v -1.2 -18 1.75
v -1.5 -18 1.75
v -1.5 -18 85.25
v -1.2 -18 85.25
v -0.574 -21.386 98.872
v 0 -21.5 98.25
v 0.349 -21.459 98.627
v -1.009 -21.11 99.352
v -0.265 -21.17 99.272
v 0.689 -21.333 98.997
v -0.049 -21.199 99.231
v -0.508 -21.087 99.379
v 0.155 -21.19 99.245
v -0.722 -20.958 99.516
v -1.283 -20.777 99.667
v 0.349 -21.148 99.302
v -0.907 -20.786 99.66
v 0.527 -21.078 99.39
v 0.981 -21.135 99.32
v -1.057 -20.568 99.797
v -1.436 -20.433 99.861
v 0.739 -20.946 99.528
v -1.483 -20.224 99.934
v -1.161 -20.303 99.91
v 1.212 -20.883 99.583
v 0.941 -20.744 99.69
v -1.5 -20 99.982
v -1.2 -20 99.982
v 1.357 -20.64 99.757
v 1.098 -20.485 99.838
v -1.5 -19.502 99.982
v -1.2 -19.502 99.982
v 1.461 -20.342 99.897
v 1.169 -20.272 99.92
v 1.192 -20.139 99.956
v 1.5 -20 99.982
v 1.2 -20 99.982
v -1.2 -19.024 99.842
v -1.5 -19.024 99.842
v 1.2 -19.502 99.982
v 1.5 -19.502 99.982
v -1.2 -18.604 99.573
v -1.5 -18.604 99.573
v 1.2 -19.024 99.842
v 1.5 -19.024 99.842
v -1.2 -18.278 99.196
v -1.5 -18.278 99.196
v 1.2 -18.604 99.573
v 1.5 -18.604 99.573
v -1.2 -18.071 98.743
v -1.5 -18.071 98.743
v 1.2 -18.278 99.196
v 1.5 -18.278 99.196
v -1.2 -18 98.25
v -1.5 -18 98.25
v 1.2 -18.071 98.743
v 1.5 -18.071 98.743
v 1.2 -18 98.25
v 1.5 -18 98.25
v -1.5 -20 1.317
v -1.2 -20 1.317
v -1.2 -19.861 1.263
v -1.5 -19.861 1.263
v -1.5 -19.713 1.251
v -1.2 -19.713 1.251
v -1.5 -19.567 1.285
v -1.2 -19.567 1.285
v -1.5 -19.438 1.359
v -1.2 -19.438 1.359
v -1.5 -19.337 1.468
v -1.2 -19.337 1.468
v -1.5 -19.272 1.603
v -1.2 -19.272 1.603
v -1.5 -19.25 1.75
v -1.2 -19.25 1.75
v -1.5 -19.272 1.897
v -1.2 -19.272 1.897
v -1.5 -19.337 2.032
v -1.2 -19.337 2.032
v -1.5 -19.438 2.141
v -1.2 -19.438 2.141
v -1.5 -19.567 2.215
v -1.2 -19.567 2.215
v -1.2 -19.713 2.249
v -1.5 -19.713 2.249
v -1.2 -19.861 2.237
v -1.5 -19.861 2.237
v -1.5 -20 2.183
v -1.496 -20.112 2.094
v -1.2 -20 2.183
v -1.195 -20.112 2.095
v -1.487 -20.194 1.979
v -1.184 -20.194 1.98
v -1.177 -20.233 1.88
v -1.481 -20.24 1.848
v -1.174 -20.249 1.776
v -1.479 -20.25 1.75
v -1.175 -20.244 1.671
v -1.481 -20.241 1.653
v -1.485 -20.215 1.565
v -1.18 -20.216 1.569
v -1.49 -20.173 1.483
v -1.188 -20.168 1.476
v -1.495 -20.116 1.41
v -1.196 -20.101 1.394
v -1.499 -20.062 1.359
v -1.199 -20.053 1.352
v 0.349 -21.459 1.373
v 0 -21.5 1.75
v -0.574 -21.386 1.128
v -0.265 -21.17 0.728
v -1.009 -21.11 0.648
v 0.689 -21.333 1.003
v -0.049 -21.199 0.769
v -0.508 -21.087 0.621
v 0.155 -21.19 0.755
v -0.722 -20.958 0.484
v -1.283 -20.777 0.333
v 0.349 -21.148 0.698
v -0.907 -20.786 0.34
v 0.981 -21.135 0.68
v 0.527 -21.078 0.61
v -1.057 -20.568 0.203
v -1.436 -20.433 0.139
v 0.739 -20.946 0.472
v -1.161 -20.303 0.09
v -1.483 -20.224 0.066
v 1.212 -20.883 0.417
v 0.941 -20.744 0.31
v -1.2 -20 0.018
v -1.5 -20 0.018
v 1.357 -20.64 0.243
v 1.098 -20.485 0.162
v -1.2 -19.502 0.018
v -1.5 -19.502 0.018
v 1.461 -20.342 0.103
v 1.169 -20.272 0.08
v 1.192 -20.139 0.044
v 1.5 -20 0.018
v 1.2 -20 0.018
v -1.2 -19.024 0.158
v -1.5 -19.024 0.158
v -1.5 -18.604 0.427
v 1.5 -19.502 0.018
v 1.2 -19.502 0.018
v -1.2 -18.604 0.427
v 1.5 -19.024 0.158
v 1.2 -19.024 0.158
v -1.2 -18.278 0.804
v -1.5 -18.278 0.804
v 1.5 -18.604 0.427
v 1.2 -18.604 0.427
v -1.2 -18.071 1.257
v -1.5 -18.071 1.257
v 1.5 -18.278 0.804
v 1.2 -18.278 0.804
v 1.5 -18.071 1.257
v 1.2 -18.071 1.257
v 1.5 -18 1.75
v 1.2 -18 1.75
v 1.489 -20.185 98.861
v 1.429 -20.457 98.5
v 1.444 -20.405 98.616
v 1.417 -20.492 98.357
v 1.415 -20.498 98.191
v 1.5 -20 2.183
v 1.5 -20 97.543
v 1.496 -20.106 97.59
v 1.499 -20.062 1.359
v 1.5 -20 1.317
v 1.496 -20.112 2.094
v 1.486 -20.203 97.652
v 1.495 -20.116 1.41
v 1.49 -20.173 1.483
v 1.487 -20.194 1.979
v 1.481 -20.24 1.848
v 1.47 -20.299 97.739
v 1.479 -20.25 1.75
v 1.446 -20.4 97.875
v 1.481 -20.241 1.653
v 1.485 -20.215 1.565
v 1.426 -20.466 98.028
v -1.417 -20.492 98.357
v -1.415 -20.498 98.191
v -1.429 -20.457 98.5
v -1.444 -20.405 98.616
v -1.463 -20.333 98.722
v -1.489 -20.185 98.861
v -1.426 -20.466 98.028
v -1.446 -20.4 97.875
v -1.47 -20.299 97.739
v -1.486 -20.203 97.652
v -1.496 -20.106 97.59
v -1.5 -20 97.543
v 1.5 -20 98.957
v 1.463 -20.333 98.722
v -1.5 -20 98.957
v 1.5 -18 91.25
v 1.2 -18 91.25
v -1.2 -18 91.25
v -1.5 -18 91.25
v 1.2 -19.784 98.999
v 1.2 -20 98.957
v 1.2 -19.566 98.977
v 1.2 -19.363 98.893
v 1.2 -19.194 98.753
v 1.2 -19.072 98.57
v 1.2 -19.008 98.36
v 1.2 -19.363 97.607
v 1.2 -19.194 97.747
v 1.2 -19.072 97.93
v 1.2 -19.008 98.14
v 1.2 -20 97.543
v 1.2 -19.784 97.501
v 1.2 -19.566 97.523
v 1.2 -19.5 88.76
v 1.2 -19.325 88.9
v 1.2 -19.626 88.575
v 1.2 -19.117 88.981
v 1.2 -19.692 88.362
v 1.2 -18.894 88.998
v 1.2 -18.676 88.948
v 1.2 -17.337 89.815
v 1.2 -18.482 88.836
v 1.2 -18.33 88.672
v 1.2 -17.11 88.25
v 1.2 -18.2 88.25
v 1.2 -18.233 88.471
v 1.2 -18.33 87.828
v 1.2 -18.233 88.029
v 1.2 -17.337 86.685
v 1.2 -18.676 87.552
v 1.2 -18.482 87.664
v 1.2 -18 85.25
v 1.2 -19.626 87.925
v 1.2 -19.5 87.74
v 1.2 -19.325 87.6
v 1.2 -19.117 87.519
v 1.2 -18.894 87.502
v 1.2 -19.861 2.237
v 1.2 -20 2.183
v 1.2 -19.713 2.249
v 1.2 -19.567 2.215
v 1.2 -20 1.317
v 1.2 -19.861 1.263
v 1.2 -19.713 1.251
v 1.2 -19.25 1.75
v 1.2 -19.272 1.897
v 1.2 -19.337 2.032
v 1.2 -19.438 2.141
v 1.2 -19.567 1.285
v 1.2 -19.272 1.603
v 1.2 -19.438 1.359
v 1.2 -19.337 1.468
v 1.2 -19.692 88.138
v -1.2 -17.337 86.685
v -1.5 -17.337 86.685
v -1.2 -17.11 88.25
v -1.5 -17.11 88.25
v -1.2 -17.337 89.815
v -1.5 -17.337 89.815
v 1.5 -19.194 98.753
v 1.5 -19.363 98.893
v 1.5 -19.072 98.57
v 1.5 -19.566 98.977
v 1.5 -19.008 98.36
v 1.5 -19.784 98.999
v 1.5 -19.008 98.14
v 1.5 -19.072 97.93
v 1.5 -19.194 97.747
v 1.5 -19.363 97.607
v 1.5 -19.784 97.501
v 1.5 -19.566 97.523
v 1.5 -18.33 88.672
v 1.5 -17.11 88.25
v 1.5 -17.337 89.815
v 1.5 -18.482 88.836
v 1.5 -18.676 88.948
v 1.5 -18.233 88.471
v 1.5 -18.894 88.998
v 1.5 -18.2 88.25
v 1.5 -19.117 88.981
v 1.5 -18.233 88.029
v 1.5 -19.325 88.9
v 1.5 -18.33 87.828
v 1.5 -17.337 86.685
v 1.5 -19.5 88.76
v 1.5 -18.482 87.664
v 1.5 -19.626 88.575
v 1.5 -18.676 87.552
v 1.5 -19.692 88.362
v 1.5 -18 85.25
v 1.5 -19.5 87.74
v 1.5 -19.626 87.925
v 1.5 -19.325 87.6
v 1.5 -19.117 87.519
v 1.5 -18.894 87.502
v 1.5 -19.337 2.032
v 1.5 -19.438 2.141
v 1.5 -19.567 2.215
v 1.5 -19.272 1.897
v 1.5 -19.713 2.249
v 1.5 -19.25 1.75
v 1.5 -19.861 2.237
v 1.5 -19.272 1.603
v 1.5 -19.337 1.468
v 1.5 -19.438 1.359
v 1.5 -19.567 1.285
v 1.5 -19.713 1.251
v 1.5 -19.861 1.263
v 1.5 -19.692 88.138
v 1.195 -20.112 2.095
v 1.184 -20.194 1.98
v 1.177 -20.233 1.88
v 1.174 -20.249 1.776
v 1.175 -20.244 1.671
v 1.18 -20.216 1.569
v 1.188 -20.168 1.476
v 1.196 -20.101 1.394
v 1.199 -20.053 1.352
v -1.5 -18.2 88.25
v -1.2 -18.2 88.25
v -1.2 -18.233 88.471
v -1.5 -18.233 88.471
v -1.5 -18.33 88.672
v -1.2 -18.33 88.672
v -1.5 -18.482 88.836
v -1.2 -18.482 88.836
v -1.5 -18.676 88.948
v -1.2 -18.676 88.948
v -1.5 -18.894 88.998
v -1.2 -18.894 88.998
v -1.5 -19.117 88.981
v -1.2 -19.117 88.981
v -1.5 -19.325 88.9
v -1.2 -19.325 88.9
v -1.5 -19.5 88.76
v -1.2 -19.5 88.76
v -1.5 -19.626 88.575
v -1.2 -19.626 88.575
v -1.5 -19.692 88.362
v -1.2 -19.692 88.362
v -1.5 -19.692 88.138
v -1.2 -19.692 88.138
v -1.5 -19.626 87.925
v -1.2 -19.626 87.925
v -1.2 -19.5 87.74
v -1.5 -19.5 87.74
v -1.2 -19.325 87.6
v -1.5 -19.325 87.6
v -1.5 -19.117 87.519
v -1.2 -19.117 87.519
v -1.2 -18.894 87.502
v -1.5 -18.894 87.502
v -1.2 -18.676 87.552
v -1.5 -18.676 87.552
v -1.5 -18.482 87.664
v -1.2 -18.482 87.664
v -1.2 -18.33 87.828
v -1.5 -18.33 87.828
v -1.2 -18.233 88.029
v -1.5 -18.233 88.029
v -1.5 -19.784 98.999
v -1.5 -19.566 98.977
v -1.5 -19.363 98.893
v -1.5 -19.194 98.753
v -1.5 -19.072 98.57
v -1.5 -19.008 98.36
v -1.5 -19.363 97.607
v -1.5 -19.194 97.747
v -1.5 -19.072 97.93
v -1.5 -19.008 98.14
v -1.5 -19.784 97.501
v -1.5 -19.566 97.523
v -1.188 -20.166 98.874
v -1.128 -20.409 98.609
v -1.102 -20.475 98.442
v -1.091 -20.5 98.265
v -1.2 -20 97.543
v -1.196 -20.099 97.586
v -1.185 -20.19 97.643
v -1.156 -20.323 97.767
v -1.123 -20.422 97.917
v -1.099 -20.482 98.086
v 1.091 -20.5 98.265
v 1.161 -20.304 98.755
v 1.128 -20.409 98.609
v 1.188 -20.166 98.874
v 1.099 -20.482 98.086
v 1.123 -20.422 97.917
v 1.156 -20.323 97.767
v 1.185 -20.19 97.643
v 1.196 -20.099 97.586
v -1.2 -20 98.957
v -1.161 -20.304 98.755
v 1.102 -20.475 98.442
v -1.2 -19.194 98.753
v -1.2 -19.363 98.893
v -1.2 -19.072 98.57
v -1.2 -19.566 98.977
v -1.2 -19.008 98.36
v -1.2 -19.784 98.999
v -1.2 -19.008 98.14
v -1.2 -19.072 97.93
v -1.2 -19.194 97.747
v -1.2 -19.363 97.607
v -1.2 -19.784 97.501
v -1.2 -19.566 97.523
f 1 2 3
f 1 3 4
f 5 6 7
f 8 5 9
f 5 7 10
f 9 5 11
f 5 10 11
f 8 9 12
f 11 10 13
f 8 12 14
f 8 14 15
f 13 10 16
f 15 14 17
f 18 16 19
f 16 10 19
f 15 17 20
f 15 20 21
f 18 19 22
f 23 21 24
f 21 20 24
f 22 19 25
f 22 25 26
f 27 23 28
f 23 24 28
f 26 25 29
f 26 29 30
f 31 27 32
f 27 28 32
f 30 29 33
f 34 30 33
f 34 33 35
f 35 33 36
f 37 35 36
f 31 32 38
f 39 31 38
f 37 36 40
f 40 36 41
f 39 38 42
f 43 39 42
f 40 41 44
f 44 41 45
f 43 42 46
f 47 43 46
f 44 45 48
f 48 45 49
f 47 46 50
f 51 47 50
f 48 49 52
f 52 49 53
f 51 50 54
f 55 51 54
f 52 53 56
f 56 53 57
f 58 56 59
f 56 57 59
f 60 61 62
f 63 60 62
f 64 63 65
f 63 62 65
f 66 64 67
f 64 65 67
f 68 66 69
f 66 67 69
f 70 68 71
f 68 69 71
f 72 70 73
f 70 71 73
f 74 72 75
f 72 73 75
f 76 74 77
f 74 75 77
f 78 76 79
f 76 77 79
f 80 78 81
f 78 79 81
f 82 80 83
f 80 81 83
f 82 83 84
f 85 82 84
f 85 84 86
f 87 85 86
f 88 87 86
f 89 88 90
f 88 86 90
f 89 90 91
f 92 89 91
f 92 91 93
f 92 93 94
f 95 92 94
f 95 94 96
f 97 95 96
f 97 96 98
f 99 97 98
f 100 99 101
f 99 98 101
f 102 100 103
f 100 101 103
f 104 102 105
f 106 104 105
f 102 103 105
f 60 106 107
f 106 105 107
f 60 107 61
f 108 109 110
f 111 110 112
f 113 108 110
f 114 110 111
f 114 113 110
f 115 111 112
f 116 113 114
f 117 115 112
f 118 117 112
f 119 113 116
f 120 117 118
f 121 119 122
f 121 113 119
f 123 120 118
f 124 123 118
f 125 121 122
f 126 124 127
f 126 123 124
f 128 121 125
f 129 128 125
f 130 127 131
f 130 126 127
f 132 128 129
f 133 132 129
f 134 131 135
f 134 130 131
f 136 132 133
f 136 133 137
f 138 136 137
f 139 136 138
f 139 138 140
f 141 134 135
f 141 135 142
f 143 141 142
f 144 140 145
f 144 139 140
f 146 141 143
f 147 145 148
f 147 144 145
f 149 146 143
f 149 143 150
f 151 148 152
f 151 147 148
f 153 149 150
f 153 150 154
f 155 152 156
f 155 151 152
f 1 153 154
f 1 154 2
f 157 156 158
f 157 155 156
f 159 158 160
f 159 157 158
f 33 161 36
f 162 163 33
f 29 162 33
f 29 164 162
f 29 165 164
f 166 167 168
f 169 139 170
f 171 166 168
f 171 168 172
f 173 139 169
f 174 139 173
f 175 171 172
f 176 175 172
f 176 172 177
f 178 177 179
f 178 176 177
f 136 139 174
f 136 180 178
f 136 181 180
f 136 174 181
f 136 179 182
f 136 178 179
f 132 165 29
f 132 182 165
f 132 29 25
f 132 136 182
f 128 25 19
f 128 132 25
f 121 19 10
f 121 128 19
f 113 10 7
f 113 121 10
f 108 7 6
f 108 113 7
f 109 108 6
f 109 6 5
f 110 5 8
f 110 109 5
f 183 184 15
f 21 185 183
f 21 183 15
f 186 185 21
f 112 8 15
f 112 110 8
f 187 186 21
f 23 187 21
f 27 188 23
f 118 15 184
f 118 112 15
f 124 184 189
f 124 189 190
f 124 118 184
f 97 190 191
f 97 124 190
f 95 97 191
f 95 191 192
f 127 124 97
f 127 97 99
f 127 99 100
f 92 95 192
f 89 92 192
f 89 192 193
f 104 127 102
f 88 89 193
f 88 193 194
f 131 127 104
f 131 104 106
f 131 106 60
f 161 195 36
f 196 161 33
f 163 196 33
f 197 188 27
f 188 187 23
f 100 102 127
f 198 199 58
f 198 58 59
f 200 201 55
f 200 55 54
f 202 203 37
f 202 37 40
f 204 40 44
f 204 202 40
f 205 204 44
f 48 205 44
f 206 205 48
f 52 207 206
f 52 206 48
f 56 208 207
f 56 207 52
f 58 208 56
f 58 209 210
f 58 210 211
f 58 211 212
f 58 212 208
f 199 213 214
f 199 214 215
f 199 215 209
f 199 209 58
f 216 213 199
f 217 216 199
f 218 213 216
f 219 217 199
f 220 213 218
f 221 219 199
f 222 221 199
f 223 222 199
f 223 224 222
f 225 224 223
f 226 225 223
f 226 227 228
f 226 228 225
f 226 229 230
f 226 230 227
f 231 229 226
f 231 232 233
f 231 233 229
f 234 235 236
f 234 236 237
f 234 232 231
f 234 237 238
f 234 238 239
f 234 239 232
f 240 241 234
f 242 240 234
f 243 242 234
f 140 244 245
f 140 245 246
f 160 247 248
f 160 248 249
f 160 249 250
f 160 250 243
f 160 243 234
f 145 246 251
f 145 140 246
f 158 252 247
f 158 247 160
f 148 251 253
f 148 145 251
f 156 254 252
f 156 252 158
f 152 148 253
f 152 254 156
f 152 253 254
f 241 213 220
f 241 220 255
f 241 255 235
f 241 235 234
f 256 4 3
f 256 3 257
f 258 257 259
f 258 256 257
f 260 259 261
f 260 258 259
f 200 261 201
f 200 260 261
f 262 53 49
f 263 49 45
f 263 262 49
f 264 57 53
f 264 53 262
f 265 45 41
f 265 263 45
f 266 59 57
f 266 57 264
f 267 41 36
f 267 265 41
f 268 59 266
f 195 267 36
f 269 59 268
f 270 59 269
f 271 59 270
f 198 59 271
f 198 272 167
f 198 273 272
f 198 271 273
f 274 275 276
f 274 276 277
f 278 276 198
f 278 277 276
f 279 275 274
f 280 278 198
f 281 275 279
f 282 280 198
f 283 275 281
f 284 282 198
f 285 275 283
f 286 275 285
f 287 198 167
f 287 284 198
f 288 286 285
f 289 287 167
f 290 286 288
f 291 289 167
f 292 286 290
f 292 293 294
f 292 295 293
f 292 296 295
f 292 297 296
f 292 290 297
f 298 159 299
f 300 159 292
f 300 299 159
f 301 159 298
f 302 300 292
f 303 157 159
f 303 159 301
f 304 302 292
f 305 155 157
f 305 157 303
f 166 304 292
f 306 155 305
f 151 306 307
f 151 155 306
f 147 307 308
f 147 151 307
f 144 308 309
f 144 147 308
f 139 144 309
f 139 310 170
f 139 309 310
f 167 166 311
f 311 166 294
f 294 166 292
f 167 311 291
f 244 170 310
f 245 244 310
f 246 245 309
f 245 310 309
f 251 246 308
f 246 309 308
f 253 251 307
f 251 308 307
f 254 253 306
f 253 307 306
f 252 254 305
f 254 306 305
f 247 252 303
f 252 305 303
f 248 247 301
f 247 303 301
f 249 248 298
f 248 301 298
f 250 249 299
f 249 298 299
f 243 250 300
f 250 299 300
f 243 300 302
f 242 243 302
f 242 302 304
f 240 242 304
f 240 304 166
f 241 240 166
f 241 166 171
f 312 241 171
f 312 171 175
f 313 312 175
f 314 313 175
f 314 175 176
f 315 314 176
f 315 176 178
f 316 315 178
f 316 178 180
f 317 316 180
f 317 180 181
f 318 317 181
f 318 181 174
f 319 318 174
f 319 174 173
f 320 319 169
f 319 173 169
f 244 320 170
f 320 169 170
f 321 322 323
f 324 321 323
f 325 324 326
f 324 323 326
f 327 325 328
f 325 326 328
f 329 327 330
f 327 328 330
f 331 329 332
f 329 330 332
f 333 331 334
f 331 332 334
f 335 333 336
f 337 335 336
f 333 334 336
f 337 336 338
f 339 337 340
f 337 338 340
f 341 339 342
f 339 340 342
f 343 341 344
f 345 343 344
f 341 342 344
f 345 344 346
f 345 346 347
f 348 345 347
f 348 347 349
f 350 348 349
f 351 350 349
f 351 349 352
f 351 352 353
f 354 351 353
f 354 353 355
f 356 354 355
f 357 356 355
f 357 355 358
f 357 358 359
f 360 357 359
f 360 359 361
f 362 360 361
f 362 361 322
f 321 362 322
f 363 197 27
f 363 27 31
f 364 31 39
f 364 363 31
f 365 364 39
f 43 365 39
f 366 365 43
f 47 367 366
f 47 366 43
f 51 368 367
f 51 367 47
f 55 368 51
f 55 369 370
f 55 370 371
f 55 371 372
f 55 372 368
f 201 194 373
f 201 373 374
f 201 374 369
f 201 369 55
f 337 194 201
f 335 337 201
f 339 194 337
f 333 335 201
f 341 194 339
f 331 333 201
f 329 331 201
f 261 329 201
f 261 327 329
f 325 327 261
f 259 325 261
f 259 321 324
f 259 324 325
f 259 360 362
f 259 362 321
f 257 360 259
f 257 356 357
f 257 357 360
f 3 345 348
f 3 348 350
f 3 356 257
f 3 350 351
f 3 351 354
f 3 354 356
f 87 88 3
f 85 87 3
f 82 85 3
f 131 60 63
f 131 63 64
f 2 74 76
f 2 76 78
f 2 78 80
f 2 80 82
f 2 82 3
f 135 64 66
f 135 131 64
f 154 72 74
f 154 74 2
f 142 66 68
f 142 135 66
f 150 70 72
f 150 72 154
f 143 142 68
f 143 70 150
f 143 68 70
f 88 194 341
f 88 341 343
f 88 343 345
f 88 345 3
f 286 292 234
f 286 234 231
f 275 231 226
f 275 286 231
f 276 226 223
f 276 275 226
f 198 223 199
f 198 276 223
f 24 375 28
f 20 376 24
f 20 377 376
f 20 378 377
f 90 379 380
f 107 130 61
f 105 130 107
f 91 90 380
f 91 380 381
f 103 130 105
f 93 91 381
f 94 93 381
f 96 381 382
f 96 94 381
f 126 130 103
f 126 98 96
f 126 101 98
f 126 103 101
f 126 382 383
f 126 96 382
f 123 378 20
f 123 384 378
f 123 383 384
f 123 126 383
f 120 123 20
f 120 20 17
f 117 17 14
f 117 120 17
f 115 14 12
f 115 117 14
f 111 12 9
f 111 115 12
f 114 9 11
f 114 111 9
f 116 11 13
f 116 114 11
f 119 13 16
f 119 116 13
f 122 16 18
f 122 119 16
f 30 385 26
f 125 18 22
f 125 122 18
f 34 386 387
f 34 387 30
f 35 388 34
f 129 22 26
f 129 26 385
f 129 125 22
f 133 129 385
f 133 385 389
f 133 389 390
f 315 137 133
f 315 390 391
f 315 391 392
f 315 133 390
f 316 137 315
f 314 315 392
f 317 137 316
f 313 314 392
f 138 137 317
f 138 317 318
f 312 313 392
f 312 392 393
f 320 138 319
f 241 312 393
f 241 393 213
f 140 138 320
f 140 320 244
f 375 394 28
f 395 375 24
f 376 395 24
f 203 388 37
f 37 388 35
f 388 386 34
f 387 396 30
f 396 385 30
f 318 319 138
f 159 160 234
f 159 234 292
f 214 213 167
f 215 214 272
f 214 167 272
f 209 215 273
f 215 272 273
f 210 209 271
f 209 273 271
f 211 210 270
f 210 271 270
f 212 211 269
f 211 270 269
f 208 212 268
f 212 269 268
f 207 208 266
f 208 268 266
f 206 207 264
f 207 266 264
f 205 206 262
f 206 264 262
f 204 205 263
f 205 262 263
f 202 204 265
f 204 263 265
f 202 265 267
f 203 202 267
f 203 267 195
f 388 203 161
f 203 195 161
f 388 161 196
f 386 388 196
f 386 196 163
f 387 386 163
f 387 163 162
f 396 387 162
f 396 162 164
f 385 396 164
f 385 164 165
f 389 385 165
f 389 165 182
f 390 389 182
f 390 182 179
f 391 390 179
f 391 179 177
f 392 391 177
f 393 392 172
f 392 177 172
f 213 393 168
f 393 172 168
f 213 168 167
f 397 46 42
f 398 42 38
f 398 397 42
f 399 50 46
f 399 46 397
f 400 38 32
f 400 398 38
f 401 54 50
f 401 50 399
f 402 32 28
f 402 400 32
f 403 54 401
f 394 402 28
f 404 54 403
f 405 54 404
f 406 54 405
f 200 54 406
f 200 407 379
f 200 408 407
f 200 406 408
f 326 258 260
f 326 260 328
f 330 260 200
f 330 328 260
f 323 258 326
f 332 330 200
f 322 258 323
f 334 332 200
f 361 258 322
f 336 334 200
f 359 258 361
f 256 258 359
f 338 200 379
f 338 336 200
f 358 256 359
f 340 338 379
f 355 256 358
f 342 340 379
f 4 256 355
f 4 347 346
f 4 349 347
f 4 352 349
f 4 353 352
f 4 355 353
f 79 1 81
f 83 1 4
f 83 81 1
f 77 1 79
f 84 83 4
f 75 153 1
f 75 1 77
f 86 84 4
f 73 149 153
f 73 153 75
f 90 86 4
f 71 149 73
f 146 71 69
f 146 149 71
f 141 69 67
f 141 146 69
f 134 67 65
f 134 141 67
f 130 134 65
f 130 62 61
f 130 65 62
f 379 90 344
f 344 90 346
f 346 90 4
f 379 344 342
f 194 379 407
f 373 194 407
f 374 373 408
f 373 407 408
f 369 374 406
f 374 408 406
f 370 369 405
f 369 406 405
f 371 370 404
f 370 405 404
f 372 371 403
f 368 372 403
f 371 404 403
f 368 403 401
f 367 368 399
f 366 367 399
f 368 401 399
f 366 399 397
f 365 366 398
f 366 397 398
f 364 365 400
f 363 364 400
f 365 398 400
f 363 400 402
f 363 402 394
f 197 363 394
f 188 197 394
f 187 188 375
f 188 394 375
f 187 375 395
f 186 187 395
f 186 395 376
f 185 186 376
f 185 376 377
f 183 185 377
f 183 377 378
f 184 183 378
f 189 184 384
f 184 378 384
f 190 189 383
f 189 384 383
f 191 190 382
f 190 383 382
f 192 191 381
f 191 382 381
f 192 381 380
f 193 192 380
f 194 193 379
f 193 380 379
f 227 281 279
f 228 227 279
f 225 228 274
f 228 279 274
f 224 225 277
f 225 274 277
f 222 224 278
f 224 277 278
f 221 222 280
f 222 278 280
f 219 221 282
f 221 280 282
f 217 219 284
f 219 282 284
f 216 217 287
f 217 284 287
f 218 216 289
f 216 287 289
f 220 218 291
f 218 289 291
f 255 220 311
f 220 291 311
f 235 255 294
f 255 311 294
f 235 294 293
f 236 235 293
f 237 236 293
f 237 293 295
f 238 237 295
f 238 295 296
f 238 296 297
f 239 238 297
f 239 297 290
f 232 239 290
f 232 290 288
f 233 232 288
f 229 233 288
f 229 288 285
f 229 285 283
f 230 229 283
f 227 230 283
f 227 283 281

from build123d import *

# Parameters (mm, degrees)
ESTRUSIONE_ESTRUSIONE1_DEPTH = 100
SCHIZZO2_R                   = 0.75
SCHIZZO2_R_2                 = 0.5
TAGLIO_ESTRUSIONE5_DEPTH     = 100
ESTRUSIONE_ESTRUSIONE2_DEPTH = 0.3
ESTRUSIONE_ESTRUSIONE3_START = -0.3
ESTRUSIONE_ESTRUSIONE3_DEPTH = 0.3


with BuildPart() as part:
    # Schizzo1 → Estrusione-Estrusione1 (new body)
    with BuildSketch(Plane.XY):
        with BuildLine():
            Line((-1.5, -18), (-1.2, -18))
            Line((-1.2, -18), (-1.2, -20))
            ThreePointArc((-1.2, -20), (0, -21.2), (1.2, -20))
            Line((1.2, -20), (1.2, -18))
            Line((1.2, -18), (1.5, -18))
            Line((1.5, -18), (1.5, -20))
            ThreePointArc((1.5, -20), (0, -21.5), (-1.5, -20))
            Line((-1.5, -20), (-1.5, -18))
        make_face()
    extrude(amount=ESTRUSIONE_ESTRUSIONE1_DEPTH)

    # Schizzo2 → Taglio-Estrusione5 (cut)
    with BuildSketch(Plane(origin=(1.5, 0, 0), x_dir=(0, 0, -1), z_dir=(1, 0, 0))):
        with Locations(Location((-98.25, -19.75, 0), (0, 0, 340.528779366))):
            Circle(SCHIZZO2_R)
        with Locations(Location((-88.25, -18.95, 0), (0, 0, 90))):
            Circle(SCHIZZO2_R)
        with Locations(Location((-1.75, -19.75, 0), (0, 0, 330))):
            Circle(SCHIZZO2_R_2)
        with BuildLine():
            Line((-98.25, -18), (-98.25, -16.563576213))
            Line((-98.25, -16.563576213), (-100.988318438, -16.563576213))
            Line((-100.988318438, -16.563576213), (-100.988318438, -22.305317171))
            Line((-100.988318438, -22.305317171), (-98.25, -22.305317171))
            Line((-98.25, -22.305317171), (-98.25, -21.5))
            ThreePointArc((-98.25, -21.5), (-100, -19.75), (-98.25, -18))
        make_face()
        with BuildLine():
            Line((-1.75, -18), (-1.75, -17.014244045))
            Line((-1.75, -17.014244045), (0.783864607, -17.014244045))
            Line((0.783864607, -17.014244045), (0.783864607, -22.108114786))
            Line((0.783864607, -22.108114786), (-1.75, -22.108114786))
            Line((-1.75, -22.108114786), (-1.75, -21.5))
            ThreePointArc((-1.75, -21.5), (0, -19.75), (-1.75, -18))
        make_face()
    extrude(amount=-TAGLIO_ESTRUSIONE5_DEPTH, mode=Mode.SUBTRACT)

    # Schizzo3 → Estrusione-Estrusione2 (add)
    with BuildSketch(Plane(origin=(1.5, 0, 0), x_dir=(0, 0, -1), z_dir=(1, 0, 0))):
        with BuildLine():
            Line((-91.25, -18), (-85.25, -18))
            ThreePointArc((-85.25, -18), (-88.25, -17.109772229), (-91.25, -18))
        make_face()
    extrude(amount=-ESTRUSIONE_ESTRUSIONE2_DEPTH)

    # Schizzo4 → Estrusione-Estrusione3 (add)
    with BuildSketch(Plane.ZY.offset(1.5).offset(ESTRUSIONE_ESTRUSIONE3_START)):
        with BuildLine():
            Line((91.25, -18), (85.25, -18))
            ThreePointArc((85.25, -18), (88.25, -17.109772229), (91.25, -18))
        make_face()
    extrude(amount=ESTRUSIONE_ESTRUSIONE3_DEPTH)


solid = part.part
